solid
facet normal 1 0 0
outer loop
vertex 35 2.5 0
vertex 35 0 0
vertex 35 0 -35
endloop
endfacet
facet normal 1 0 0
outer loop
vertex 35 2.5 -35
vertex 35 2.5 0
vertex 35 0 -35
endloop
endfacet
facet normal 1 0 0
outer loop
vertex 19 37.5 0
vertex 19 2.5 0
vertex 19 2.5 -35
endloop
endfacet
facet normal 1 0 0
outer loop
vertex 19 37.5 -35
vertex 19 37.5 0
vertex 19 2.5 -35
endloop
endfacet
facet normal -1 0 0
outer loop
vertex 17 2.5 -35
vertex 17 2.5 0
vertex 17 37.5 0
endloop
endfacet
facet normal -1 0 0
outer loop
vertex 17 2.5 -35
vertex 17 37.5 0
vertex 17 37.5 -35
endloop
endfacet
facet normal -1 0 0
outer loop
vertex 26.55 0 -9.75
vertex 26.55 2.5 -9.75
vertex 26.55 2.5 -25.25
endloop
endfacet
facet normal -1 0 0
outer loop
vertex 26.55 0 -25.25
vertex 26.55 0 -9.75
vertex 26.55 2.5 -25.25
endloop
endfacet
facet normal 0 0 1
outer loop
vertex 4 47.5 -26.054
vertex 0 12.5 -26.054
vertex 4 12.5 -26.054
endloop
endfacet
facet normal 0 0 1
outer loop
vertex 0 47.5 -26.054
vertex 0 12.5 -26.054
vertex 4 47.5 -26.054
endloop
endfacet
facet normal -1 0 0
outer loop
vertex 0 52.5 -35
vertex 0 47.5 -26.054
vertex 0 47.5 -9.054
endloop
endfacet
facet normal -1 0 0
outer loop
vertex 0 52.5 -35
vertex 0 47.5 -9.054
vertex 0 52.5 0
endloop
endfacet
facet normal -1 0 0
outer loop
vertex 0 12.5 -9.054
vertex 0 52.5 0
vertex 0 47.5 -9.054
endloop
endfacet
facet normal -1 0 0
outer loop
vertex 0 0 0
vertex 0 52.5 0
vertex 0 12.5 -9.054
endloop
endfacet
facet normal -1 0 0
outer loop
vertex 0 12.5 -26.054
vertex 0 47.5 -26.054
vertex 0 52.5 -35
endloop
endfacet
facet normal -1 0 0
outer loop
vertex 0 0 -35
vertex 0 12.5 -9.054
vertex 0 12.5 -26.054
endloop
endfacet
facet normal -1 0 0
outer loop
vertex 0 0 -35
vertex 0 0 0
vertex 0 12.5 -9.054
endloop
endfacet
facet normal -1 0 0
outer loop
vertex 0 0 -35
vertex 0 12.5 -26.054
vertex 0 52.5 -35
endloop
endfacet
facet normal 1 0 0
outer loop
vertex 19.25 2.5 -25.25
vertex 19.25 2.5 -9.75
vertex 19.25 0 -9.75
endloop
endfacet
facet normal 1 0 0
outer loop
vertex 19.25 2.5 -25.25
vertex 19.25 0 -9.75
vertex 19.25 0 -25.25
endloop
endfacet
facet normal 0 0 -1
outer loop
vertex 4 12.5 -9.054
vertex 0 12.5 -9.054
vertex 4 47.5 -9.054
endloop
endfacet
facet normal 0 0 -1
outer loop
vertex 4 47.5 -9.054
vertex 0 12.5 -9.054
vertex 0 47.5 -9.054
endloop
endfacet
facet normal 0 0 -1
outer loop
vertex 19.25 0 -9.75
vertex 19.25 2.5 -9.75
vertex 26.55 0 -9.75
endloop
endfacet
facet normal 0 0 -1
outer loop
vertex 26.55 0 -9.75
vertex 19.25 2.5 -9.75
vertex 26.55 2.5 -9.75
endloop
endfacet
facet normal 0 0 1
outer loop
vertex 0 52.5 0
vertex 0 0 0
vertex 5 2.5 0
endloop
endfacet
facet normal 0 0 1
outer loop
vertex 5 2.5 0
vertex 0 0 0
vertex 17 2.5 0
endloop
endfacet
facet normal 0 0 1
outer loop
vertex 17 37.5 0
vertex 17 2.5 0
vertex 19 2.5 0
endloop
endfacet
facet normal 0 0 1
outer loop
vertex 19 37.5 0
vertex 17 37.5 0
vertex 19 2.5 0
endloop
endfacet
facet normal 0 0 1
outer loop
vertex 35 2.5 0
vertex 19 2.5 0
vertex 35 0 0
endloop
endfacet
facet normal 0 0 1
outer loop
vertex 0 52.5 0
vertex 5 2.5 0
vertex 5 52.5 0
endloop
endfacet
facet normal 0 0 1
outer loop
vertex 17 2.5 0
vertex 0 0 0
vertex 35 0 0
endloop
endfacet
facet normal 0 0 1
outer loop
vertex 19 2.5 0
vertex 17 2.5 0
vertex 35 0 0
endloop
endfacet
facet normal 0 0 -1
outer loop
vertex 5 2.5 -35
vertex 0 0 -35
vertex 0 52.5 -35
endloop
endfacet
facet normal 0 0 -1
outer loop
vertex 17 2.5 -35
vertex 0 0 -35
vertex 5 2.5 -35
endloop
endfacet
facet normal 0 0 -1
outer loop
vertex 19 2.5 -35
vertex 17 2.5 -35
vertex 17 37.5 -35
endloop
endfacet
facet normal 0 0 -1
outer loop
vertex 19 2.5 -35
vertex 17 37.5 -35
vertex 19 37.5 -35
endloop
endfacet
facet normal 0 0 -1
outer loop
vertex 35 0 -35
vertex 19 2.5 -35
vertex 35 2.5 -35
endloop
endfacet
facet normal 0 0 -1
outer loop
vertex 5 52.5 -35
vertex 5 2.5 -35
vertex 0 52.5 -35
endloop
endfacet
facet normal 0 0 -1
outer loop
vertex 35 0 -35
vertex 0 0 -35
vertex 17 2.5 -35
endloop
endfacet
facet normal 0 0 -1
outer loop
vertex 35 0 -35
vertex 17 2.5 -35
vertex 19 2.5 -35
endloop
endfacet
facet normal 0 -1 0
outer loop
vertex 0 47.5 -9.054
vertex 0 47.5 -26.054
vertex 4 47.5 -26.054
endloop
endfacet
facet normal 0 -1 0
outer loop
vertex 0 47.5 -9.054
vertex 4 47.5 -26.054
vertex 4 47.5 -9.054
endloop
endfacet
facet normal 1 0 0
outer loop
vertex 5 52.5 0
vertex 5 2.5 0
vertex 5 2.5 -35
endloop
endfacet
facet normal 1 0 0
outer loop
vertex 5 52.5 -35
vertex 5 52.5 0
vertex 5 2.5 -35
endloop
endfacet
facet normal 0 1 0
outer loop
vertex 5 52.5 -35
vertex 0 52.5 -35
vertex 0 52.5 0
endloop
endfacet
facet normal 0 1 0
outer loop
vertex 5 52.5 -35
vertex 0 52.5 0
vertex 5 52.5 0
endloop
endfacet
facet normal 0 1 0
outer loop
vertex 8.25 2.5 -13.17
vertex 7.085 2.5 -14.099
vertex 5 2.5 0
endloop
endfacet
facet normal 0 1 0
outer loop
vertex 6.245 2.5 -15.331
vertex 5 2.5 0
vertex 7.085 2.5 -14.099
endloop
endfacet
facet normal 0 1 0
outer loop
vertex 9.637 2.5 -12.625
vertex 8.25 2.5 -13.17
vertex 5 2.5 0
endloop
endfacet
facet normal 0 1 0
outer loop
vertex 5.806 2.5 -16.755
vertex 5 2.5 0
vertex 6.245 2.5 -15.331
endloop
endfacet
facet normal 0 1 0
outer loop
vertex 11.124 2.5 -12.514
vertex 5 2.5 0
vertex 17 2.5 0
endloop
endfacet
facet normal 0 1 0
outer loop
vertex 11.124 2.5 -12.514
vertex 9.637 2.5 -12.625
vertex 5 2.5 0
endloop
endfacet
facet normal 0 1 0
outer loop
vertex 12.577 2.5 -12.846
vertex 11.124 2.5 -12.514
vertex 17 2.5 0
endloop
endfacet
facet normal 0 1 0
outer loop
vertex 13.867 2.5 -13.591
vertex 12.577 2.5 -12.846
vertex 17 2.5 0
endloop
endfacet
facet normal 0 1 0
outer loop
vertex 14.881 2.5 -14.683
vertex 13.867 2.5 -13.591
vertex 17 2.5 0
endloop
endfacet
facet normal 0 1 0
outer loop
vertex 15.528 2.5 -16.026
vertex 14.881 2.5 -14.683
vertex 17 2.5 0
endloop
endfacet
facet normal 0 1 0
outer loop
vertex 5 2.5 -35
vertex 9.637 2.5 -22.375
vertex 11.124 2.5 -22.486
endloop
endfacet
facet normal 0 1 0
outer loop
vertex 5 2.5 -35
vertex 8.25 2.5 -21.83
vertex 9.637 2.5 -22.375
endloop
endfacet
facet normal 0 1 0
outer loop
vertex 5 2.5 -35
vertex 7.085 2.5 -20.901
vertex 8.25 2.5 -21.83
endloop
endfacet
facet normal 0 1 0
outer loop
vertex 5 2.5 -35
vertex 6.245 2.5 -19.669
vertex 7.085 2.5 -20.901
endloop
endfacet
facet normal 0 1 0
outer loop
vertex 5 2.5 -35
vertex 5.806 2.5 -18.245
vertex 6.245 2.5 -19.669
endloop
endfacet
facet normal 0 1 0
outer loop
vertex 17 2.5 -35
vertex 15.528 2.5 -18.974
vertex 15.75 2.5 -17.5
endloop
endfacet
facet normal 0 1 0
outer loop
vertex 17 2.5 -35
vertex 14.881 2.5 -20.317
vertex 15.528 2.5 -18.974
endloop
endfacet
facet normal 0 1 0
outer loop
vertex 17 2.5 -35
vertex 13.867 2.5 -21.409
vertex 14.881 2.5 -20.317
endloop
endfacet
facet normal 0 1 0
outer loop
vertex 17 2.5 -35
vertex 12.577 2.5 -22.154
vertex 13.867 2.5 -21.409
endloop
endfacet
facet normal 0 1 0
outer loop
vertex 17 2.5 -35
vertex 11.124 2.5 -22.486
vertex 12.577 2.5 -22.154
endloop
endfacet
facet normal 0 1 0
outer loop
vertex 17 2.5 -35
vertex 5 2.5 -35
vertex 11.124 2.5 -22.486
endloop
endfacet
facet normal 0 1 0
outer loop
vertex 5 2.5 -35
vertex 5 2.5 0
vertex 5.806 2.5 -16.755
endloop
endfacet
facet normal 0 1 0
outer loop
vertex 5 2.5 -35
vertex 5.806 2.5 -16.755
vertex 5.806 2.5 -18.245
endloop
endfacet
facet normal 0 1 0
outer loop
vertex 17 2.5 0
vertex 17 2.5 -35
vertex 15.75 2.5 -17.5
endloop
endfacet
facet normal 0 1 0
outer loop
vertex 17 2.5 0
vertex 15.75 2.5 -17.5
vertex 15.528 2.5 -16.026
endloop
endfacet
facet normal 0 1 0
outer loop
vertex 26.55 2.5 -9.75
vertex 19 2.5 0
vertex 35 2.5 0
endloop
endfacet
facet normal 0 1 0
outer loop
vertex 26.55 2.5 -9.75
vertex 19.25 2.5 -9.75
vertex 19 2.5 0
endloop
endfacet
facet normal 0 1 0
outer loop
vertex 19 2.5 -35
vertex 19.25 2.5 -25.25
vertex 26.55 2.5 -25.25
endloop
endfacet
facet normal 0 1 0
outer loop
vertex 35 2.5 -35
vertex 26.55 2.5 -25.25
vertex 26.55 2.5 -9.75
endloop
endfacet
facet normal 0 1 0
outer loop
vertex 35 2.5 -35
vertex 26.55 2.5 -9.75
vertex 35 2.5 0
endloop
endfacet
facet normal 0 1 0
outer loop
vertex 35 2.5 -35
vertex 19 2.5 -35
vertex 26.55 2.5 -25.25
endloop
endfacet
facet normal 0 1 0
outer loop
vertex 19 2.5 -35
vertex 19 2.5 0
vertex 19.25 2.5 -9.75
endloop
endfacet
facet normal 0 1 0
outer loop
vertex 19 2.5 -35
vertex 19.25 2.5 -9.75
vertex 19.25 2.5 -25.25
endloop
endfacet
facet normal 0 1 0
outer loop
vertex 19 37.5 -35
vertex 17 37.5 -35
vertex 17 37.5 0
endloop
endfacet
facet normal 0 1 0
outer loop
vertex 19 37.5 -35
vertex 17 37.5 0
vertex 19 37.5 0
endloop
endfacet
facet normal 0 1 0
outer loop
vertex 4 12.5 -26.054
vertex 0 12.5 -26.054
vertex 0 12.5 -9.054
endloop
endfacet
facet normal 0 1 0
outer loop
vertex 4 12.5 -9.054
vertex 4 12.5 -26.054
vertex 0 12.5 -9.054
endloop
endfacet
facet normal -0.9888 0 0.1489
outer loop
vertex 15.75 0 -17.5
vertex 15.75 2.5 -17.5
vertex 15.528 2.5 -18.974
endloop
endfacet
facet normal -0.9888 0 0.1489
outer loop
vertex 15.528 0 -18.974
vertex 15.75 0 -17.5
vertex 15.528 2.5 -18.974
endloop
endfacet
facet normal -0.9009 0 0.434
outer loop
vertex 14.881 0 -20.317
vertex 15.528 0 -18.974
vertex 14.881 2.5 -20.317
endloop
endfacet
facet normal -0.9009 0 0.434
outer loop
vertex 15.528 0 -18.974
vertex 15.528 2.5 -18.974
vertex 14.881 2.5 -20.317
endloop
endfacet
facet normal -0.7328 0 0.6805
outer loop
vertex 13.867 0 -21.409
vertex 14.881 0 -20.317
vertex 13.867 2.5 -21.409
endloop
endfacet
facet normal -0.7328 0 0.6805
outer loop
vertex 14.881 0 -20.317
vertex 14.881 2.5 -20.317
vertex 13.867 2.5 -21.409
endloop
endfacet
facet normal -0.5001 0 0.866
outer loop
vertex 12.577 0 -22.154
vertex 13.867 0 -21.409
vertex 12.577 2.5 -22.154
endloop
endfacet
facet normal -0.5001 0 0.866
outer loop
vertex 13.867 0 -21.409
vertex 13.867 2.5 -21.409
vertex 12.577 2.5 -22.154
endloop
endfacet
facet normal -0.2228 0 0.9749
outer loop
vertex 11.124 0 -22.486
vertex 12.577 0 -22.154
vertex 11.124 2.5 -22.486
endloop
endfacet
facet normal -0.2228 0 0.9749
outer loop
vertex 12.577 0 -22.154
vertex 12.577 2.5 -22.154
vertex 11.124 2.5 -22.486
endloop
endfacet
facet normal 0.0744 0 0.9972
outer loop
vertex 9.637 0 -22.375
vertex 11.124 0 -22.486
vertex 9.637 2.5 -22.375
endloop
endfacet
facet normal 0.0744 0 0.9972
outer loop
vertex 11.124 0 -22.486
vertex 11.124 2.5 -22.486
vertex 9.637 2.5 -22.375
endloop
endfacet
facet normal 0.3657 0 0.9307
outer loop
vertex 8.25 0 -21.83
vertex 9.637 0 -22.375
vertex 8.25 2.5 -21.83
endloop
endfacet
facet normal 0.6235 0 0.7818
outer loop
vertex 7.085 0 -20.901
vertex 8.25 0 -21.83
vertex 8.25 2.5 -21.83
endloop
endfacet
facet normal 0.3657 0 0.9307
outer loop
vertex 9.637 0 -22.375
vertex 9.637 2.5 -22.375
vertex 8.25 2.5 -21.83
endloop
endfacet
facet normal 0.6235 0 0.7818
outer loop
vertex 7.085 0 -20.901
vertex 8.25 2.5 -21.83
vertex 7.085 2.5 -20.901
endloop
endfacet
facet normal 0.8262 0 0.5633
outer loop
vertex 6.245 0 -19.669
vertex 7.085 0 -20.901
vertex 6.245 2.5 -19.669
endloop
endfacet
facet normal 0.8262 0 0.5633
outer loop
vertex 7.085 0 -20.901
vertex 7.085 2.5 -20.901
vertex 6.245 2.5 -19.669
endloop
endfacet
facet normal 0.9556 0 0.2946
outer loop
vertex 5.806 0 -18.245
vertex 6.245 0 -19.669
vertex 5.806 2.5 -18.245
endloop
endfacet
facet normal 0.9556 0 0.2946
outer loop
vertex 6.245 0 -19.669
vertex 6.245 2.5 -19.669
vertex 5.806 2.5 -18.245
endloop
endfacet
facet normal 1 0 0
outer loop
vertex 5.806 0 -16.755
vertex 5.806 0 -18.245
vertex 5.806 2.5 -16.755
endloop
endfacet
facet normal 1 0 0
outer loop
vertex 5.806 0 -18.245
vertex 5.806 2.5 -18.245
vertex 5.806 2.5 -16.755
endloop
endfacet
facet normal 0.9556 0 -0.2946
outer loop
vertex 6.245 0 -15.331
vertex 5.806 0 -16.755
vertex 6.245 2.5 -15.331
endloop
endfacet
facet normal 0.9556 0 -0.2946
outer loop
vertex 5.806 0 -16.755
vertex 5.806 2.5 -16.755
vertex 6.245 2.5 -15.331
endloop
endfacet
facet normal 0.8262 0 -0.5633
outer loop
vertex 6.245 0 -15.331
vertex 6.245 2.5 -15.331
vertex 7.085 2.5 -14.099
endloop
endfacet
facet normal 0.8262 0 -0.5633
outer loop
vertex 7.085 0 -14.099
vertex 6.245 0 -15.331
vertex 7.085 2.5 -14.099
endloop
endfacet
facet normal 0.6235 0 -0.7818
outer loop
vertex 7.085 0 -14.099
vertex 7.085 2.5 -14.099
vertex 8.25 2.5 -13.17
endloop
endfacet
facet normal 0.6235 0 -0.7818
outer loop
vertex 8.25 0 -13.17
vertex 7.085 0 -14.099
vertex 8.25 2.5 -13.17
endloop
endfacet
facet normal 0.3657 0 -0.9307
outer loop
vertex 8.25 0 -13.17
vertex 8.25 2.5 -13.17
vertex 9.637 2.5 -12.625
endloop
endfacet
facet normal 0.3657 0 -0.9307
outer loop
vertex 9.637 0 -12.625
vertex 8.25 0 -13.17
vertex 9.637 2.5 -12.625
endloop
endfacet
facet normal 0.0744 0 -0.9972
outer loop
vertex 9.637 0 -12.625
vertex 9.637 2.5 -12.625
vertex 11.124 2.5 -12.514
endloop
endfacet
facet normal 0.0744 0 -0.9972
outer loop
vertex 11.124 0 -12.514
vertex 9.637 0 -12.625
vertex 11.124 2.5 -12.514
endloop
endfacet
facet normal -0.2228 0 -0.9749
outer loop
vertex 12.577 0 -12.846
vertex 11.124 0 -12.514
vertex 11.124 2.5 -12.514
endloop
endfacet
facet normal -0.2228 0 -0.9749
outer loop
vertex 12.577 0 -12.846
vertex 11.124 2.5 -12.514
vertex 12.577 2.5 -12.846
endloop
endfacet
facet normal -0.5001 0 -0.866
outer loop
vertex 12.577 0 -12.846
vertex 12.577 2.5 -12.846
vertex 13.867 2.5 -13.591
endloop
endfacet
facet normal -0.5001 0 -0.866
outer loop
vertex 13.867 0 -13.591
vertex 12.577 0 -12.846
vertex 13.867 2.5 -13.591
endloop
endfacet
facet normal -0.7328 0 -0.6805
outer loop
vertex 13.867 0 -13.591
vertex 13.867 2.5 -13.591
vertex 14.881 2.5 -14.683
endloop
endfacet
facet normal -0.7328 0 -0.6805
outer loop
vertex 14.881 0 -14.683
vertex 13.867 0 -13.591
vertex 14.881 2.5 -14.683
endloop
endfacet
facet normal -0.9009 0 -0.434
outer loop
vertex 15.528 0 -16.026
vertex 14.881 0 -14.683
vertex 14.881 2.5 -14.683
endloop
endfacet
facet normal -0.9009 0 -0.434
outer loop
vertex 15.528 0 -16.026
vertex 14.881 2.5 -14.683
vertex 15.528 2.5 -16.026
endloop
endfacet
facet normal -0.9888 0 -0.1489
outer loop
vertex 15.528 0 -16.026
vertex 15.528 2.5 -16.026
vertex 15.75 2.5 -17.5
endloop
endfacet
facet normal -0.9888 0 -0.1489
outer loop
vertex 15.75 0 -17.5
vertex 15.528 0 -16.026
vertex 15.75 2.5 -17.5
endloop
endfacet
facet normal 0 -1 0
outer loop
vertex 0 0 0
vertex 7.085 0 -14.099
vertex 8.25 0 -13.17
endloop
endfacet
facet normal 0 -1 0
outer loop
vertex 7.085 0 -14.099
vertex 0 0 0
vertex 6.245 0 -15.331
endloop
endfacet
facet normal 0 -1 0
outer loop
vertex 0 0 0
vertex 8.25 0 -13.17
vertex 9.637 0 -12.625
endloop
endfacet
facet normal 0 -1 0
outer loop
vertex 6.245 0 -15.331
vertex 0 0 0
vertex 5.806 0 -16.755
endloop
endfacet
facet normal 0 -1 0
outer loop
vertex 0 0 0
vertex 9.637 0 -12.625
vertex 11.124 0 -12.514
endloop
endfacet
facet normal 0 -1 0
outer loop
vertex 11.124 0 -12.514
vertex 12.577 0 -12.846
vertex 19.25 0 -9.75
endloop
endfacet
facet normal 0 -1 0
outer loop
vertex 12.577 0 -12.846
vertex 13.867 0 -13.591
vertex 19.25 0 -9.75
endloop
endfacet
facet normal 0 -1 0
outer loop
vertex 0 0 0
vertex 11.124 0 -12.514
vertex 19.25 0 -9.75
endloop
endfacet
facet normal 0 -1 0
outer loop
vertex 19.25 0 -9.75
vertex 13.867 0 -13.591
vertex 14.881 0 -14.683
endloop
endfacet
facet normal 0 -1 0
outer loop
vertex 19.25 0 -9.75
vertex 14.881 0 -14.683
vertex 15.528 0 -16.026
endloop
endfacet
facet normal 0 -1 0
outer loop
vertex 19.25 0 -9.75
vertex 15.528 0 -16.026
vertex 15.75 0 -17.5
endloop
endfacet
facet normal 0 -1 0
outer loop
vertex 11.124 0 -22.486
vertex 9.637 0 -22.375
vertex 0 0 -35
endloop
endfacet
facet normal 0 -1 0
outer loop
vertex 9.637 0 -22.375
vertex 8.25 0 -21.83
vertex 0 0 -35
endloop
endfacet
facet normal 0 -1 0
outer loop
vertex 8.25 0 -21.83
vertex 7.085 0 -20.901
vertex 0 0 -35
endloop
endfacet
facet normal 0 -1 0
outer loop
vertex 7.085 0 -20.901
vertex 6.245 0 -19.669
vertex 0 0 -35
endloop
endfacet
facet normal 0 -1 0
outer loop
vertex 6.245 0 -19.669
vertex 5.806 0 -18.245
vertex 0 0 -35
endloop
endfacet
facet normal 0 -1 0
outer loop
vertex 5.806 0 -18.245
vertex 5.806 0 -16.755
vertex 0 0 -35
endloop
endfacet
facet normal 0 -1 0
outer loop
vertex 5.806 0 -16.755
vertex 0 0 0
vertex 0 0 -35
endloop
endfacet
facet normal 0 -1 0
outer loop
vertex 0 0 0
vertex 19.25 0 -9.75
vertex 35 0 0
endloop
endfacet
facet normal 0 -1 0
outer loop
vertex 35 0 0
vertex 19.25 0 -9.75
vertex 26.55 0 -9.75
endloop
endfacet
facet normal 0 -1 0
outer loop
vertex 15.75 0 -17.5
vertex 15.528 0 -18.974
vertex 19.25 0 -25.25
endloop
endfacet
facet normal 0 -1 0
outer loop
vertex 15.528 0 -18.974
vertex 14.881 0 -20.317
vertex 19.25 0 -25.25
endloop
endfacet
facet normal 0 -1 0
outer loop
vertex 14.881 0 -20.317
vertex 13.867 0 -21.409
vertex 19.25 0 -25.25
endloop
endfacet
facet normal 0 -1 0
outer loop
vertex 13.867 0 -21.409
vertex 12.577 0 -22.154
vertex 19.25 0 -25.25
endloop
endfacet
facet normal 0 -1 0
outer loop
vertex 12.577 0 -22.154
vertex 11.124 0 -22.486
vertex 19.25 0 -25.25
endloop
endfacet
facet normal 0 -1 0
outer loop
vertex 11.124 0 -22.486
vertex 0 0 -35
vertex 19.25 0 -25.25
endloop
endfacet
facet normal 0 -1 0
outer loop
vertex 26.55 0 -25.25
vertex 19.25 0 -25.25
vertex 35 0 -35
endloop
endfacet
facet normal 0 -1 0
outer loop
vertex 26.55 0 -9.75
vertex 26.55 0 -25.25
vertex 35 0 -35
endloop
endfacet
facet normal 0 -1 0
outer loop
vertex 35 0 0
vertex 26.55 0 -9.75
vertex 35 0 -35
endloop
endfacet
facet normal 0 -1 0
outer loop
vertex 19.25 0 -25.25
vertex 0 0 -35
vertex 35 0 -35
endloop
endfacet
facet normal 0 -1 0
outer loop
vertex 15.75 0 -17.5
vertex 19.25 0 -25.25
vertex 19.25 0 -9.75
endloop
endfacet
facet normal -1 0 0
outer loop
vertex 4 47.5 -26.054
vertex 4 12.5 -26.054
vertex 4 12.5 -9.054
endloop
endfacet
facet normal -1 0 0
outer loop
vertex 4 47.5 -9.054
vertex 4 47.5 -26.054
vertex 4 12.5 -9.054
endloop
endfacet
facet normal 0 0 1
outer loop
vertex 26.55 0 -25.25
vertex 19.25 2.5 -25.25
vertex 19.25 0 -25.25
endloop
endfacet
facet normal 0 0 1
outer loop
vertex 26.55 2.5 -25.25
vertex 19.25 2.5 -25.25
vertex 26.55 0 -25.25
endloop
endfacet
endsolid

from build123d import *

# Parameters (mm, degrees)
SKETCH1_W           = 35
SKETCH1_H           = 35
BOSS_EXTRUDE1_DEPTH = 2.5
SKETCH2_W           = 5
SKETCH2_H           = 35
BOSS_EXTRUDE2_DEPTH = 50
SKETCH5_W           = 17
SKETCH5_H           = 35
CUT_EXTRUDE2_DEPTH  = 4
SKETCH6_R           = 5
CUT_EXTRUDE3_DEPTH  = 10
SKETCH7_W           = 2
SKETCH7_H           = 35
BOSS_EXTRUDE3_DEPTH = 35
SKETCH8_W           = 7.3
SKETCH8_H           = 15.5
CUT_EXTRUDE4_DEPTH  = 3.5


with BuildPart() as part:
    # Sketch1 → Boss-Extrude1 (new body)
    with BuildSketch(Plane(origin=(0, 0, 0), x_dir=(1, 0, 0), z_dir=(0, 1, 0))):
        with Locations((17.5, 17.5)):
            Rectangle(SKETCH1_W, SKETCH1_H)
    extrude(amount=BOSS_EXTRUDE1_DEPTH)

    # Sketch2 → Boss-Extrude2 (add)
    with BuildSketch(Plane(origin=(0, 2.5, 0), x_dir=(1, 0, 0), z_dir=(0, 1, 0))):
        with Locations((2.5, 17.5)):
            Rectangle(SKETCH2_W, SKETCH2_H)
    extrude(amount=BOSS_EXTRUDE2_DEPTH)

    # Sketch5 → Cut-Extrude2 (cut)
    with BuildSketch(Plane.ZY):
        with Locations((-17.553851225, 30)):
            Rectangle(SKETCH5_W, SKETCH5_H)
    extrude(amount=-CUT_EXTRUDE2_DEPTH, mode=Mode.SUBTRACT)

    # Sketch6 → Cut-Extrude3 (cut)
    with BuildSketch(Plane(origin=(0, 2.5, 0), x_dir=(1, 0, 0), z_dir=(0, 1, 0))):
        with Locations((10.75, 17.5)):
            Circle(SKETCH6_R)
    extrude(amount=-CUT_EXTRUDE3_DEPTH, mode=Mode.SUBTRACT)

    # Sketch7 → Boss-Extrude3 (add)
    with BuildSketch(Plane(origin=(0, 2.5, 0), x_dir=(1, 0, 0), z_dir=(0, 1, 0))):
        with Locations((18, 17.5)):
            Rectangle(SKETCH7_W, SKETCH7_H)
    extrude(amount=BOSS_EXTRUDE3_DEPTH)

    # Sketch8 → Cut-Extrude4 (cut, through all)
    with BuildSketch(Plane(origin=(0, 2.5, 0), x_dir=(1, 0, 0), z_dir=(0, 1, 0))):
        with Locations((22.9, 17.5)):
            Rectangle(SKETCH8_W, SKETCH8_H)
    extrude(amount=-CUT_EXTRUDE4_DEPTH, mode=Mode.SUBTRACT)


solid = part.part
